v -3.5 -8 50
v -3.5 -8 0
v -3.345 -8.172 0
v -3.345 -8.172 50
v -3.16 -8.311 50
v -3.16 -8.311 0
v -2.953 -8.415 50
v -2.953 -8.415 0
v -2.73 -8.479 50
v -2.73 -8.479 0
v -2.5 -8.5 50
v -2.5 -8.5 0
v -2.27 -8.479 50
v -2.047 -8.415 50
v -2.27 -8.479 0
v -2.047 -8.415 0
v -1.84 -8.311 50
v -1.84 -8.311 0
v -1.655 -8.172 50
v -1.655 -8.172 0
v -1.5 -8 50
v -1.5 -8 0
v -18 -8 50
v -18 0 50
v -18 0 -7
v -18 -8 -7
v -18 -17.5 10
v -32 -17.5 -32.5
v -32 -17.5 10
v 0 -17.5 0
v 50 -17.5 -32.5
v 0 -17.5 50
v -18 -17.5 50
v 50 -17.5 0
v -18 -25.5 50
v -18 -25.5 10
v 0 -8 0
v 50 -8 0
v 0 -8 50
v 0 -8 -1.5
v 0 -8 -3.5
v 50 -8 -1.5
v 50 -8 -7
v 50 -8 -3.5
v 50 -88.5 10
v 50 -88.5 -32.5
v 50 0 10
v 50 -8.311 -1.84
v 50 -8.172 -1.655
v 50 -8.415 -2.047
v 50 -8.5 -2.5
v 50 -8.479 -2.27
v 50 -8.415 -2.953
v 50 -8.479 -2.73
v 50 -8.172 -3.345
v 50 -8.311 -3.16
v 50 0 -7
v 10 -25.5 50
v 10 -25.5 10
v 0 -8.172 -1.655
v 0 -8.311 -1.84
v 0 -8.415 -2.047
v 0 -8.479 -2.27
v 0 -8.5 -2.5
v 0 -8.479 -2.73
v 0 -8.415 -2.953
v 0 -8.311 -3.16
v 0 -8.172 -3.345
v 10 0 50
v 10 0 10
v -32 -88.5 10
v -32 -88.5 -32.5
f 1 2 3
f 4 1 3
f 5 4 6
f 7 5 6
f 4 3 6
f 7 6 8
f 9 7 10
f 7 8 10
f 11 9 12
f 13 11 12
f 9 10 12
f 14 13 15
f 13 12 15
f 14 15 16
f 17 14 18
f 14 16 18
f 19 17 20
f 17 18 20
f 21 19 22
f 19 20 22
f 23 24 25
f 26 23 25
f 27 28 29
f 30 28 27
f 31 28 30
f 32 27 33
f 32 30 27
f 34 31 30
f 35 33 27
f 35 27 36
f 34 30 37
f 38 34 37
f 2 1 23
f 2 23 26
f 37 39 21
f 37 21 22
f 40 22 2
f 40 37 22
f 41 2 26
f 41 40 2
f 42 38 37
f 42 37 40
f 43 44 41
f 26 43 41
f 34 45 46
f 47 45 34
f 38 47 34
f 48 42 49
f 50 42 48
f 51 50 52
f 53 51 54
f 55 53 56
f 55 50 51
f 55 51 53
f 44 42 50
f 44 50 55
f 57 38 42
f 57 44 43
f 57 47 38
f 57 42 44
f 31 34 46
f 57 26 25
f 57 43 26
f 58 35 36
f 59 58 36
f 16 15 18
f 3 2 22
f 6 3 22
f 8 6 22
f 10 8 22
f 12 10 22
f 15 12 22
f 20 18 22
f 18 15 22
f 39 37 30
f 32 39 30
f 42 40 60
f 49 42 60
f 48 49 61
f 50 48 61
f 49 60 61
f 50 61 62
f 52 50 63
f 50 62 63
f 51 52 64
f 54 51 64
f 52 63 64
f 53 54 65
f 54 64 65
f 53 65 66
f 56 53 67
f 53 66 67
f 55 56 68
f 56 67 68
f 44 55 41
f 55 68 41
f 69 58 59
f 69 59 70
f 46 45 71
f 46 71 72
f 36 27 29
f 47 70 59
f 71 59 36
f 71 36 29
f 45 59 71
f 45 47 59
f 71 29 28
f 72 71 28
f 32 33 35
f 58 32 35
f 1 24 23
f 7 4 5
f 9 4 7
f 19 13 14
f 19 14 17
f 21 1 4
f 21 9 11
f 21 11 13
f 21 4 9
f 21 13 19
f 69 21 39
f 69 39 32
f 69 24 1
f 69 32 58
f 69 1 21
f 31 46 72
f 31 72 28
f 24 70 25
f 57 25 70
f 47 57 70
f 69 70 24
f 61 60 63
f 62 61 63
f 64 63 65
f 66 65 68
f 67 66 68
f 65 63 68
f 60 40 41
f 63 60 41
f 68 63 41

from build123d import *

# Parameters (mm, degrees)
BOSS_EXTRUDE1_DEPTH = 50
SKETCH2_W           = 7
SKETCH2_H           = 8
BOSS_EXTRUDE2_DEPTH = 50
SKETCH2_3_W         = 7
SKETCH2_3_H         = 8
BOSS_EXTRUDE3_DEPTH = 18
SKETCH3_W           = 10
SKETCH3_H           = 63
SKETCH3_W_2         = 7
SKETCH3_H_2         = 8
BOSS_EXTRUDE4_DEPTH = 82


with BuildPart() as part:
    # Sketch1 → Boss-Extrude1 (new body)
    with BuildSketch(Plane.XY):
        with BuildLine():
            Line((-1.5, -8), (-3.5, -8))
            ThreePointArc((-3.5, -8), (-2.5, -8.5), (-1.5, -8))
        make_face()
        Polygon((10, -25.5), (10, 0), (0, 0), (-18, 0), (-18, -8), (0, -8), (0, -17.5), (-18, -17.5), (-18, -25.5), align=None)
    extrude(amount=BOSS_EXTRUDE1_DEPTH)

    # Sketch2 → Boss-Extrude2 (add)
    with BuildSketch(Plane(origin=(0, 0, 0), x_dir=(0, 0, -1), z_dir=(1, 0, 0))):
        Polygon((7, 0), (0, 0), (0, -8), (1.5, -8), (3.5, -8), (7, -8), align=None)
        Polygon((0, -8), (0, 0), (-10, 0), (-10, -25.5), (0, -25.5), (0, -17.5), align=None)
        with Locations((3.5, -21.5)):
            Rectangle(SKETCH2_W, SKETCH2_H)
        with BuildLine():
            Line((3.5, -8), (1.5, -8))
            ThreePointArc((1.5, -8), (2.5, -8.5), (3.5, -8))
        make_face()
    extrude(amount=BOSS_EXTRUDE2_DEPTH)

    # Sketch2<3> → Boss-Extrude3 (add)
    with BuildSketch(Plane(origin=(0, 0, 0), x_dir=(0, 0, -1), z_dir=(1, 0, 0))):
        Polygon((7, 0), (0, 0), (0, -8), (1.5, -8), (3.5, -8), (7, -8), align=None)
        with Locations((3.5, -21.5)):
            Rectangle(SKETCH2_3_W, SKETCH2_3_H)
    extrude(amount=-BOSS_EXTRUDE3_DEPTH)

    # Sketch3 → Boss-Extrude4 (add)
    with BuildSketch(Plane(origin=(50, 0, 0), x_dir=(0, 0, -1), z_dir=(1, 0, 0))):
        Polygon((32.5, -17.5), (7, -17.5), (7, -25.5), (0, -25.5), (0, -88.5), (32.5, -88.5), align=None)
        with Locations((-5, -57)):
            Rectangle(SKETCH3_W, SKETCH3_H)
        with Locations((3.5, -21.5)):
            Rectangle(SKETCH3_W_2, SKETCH3_H_2)
        with Locations((-5, -21.5)):
            Rectangle(SKETCH3_W, SKETCH3_H_2)
    extrude(amount=-BOSS_EXTRUDE4_DEPTH)


solid = part.part
